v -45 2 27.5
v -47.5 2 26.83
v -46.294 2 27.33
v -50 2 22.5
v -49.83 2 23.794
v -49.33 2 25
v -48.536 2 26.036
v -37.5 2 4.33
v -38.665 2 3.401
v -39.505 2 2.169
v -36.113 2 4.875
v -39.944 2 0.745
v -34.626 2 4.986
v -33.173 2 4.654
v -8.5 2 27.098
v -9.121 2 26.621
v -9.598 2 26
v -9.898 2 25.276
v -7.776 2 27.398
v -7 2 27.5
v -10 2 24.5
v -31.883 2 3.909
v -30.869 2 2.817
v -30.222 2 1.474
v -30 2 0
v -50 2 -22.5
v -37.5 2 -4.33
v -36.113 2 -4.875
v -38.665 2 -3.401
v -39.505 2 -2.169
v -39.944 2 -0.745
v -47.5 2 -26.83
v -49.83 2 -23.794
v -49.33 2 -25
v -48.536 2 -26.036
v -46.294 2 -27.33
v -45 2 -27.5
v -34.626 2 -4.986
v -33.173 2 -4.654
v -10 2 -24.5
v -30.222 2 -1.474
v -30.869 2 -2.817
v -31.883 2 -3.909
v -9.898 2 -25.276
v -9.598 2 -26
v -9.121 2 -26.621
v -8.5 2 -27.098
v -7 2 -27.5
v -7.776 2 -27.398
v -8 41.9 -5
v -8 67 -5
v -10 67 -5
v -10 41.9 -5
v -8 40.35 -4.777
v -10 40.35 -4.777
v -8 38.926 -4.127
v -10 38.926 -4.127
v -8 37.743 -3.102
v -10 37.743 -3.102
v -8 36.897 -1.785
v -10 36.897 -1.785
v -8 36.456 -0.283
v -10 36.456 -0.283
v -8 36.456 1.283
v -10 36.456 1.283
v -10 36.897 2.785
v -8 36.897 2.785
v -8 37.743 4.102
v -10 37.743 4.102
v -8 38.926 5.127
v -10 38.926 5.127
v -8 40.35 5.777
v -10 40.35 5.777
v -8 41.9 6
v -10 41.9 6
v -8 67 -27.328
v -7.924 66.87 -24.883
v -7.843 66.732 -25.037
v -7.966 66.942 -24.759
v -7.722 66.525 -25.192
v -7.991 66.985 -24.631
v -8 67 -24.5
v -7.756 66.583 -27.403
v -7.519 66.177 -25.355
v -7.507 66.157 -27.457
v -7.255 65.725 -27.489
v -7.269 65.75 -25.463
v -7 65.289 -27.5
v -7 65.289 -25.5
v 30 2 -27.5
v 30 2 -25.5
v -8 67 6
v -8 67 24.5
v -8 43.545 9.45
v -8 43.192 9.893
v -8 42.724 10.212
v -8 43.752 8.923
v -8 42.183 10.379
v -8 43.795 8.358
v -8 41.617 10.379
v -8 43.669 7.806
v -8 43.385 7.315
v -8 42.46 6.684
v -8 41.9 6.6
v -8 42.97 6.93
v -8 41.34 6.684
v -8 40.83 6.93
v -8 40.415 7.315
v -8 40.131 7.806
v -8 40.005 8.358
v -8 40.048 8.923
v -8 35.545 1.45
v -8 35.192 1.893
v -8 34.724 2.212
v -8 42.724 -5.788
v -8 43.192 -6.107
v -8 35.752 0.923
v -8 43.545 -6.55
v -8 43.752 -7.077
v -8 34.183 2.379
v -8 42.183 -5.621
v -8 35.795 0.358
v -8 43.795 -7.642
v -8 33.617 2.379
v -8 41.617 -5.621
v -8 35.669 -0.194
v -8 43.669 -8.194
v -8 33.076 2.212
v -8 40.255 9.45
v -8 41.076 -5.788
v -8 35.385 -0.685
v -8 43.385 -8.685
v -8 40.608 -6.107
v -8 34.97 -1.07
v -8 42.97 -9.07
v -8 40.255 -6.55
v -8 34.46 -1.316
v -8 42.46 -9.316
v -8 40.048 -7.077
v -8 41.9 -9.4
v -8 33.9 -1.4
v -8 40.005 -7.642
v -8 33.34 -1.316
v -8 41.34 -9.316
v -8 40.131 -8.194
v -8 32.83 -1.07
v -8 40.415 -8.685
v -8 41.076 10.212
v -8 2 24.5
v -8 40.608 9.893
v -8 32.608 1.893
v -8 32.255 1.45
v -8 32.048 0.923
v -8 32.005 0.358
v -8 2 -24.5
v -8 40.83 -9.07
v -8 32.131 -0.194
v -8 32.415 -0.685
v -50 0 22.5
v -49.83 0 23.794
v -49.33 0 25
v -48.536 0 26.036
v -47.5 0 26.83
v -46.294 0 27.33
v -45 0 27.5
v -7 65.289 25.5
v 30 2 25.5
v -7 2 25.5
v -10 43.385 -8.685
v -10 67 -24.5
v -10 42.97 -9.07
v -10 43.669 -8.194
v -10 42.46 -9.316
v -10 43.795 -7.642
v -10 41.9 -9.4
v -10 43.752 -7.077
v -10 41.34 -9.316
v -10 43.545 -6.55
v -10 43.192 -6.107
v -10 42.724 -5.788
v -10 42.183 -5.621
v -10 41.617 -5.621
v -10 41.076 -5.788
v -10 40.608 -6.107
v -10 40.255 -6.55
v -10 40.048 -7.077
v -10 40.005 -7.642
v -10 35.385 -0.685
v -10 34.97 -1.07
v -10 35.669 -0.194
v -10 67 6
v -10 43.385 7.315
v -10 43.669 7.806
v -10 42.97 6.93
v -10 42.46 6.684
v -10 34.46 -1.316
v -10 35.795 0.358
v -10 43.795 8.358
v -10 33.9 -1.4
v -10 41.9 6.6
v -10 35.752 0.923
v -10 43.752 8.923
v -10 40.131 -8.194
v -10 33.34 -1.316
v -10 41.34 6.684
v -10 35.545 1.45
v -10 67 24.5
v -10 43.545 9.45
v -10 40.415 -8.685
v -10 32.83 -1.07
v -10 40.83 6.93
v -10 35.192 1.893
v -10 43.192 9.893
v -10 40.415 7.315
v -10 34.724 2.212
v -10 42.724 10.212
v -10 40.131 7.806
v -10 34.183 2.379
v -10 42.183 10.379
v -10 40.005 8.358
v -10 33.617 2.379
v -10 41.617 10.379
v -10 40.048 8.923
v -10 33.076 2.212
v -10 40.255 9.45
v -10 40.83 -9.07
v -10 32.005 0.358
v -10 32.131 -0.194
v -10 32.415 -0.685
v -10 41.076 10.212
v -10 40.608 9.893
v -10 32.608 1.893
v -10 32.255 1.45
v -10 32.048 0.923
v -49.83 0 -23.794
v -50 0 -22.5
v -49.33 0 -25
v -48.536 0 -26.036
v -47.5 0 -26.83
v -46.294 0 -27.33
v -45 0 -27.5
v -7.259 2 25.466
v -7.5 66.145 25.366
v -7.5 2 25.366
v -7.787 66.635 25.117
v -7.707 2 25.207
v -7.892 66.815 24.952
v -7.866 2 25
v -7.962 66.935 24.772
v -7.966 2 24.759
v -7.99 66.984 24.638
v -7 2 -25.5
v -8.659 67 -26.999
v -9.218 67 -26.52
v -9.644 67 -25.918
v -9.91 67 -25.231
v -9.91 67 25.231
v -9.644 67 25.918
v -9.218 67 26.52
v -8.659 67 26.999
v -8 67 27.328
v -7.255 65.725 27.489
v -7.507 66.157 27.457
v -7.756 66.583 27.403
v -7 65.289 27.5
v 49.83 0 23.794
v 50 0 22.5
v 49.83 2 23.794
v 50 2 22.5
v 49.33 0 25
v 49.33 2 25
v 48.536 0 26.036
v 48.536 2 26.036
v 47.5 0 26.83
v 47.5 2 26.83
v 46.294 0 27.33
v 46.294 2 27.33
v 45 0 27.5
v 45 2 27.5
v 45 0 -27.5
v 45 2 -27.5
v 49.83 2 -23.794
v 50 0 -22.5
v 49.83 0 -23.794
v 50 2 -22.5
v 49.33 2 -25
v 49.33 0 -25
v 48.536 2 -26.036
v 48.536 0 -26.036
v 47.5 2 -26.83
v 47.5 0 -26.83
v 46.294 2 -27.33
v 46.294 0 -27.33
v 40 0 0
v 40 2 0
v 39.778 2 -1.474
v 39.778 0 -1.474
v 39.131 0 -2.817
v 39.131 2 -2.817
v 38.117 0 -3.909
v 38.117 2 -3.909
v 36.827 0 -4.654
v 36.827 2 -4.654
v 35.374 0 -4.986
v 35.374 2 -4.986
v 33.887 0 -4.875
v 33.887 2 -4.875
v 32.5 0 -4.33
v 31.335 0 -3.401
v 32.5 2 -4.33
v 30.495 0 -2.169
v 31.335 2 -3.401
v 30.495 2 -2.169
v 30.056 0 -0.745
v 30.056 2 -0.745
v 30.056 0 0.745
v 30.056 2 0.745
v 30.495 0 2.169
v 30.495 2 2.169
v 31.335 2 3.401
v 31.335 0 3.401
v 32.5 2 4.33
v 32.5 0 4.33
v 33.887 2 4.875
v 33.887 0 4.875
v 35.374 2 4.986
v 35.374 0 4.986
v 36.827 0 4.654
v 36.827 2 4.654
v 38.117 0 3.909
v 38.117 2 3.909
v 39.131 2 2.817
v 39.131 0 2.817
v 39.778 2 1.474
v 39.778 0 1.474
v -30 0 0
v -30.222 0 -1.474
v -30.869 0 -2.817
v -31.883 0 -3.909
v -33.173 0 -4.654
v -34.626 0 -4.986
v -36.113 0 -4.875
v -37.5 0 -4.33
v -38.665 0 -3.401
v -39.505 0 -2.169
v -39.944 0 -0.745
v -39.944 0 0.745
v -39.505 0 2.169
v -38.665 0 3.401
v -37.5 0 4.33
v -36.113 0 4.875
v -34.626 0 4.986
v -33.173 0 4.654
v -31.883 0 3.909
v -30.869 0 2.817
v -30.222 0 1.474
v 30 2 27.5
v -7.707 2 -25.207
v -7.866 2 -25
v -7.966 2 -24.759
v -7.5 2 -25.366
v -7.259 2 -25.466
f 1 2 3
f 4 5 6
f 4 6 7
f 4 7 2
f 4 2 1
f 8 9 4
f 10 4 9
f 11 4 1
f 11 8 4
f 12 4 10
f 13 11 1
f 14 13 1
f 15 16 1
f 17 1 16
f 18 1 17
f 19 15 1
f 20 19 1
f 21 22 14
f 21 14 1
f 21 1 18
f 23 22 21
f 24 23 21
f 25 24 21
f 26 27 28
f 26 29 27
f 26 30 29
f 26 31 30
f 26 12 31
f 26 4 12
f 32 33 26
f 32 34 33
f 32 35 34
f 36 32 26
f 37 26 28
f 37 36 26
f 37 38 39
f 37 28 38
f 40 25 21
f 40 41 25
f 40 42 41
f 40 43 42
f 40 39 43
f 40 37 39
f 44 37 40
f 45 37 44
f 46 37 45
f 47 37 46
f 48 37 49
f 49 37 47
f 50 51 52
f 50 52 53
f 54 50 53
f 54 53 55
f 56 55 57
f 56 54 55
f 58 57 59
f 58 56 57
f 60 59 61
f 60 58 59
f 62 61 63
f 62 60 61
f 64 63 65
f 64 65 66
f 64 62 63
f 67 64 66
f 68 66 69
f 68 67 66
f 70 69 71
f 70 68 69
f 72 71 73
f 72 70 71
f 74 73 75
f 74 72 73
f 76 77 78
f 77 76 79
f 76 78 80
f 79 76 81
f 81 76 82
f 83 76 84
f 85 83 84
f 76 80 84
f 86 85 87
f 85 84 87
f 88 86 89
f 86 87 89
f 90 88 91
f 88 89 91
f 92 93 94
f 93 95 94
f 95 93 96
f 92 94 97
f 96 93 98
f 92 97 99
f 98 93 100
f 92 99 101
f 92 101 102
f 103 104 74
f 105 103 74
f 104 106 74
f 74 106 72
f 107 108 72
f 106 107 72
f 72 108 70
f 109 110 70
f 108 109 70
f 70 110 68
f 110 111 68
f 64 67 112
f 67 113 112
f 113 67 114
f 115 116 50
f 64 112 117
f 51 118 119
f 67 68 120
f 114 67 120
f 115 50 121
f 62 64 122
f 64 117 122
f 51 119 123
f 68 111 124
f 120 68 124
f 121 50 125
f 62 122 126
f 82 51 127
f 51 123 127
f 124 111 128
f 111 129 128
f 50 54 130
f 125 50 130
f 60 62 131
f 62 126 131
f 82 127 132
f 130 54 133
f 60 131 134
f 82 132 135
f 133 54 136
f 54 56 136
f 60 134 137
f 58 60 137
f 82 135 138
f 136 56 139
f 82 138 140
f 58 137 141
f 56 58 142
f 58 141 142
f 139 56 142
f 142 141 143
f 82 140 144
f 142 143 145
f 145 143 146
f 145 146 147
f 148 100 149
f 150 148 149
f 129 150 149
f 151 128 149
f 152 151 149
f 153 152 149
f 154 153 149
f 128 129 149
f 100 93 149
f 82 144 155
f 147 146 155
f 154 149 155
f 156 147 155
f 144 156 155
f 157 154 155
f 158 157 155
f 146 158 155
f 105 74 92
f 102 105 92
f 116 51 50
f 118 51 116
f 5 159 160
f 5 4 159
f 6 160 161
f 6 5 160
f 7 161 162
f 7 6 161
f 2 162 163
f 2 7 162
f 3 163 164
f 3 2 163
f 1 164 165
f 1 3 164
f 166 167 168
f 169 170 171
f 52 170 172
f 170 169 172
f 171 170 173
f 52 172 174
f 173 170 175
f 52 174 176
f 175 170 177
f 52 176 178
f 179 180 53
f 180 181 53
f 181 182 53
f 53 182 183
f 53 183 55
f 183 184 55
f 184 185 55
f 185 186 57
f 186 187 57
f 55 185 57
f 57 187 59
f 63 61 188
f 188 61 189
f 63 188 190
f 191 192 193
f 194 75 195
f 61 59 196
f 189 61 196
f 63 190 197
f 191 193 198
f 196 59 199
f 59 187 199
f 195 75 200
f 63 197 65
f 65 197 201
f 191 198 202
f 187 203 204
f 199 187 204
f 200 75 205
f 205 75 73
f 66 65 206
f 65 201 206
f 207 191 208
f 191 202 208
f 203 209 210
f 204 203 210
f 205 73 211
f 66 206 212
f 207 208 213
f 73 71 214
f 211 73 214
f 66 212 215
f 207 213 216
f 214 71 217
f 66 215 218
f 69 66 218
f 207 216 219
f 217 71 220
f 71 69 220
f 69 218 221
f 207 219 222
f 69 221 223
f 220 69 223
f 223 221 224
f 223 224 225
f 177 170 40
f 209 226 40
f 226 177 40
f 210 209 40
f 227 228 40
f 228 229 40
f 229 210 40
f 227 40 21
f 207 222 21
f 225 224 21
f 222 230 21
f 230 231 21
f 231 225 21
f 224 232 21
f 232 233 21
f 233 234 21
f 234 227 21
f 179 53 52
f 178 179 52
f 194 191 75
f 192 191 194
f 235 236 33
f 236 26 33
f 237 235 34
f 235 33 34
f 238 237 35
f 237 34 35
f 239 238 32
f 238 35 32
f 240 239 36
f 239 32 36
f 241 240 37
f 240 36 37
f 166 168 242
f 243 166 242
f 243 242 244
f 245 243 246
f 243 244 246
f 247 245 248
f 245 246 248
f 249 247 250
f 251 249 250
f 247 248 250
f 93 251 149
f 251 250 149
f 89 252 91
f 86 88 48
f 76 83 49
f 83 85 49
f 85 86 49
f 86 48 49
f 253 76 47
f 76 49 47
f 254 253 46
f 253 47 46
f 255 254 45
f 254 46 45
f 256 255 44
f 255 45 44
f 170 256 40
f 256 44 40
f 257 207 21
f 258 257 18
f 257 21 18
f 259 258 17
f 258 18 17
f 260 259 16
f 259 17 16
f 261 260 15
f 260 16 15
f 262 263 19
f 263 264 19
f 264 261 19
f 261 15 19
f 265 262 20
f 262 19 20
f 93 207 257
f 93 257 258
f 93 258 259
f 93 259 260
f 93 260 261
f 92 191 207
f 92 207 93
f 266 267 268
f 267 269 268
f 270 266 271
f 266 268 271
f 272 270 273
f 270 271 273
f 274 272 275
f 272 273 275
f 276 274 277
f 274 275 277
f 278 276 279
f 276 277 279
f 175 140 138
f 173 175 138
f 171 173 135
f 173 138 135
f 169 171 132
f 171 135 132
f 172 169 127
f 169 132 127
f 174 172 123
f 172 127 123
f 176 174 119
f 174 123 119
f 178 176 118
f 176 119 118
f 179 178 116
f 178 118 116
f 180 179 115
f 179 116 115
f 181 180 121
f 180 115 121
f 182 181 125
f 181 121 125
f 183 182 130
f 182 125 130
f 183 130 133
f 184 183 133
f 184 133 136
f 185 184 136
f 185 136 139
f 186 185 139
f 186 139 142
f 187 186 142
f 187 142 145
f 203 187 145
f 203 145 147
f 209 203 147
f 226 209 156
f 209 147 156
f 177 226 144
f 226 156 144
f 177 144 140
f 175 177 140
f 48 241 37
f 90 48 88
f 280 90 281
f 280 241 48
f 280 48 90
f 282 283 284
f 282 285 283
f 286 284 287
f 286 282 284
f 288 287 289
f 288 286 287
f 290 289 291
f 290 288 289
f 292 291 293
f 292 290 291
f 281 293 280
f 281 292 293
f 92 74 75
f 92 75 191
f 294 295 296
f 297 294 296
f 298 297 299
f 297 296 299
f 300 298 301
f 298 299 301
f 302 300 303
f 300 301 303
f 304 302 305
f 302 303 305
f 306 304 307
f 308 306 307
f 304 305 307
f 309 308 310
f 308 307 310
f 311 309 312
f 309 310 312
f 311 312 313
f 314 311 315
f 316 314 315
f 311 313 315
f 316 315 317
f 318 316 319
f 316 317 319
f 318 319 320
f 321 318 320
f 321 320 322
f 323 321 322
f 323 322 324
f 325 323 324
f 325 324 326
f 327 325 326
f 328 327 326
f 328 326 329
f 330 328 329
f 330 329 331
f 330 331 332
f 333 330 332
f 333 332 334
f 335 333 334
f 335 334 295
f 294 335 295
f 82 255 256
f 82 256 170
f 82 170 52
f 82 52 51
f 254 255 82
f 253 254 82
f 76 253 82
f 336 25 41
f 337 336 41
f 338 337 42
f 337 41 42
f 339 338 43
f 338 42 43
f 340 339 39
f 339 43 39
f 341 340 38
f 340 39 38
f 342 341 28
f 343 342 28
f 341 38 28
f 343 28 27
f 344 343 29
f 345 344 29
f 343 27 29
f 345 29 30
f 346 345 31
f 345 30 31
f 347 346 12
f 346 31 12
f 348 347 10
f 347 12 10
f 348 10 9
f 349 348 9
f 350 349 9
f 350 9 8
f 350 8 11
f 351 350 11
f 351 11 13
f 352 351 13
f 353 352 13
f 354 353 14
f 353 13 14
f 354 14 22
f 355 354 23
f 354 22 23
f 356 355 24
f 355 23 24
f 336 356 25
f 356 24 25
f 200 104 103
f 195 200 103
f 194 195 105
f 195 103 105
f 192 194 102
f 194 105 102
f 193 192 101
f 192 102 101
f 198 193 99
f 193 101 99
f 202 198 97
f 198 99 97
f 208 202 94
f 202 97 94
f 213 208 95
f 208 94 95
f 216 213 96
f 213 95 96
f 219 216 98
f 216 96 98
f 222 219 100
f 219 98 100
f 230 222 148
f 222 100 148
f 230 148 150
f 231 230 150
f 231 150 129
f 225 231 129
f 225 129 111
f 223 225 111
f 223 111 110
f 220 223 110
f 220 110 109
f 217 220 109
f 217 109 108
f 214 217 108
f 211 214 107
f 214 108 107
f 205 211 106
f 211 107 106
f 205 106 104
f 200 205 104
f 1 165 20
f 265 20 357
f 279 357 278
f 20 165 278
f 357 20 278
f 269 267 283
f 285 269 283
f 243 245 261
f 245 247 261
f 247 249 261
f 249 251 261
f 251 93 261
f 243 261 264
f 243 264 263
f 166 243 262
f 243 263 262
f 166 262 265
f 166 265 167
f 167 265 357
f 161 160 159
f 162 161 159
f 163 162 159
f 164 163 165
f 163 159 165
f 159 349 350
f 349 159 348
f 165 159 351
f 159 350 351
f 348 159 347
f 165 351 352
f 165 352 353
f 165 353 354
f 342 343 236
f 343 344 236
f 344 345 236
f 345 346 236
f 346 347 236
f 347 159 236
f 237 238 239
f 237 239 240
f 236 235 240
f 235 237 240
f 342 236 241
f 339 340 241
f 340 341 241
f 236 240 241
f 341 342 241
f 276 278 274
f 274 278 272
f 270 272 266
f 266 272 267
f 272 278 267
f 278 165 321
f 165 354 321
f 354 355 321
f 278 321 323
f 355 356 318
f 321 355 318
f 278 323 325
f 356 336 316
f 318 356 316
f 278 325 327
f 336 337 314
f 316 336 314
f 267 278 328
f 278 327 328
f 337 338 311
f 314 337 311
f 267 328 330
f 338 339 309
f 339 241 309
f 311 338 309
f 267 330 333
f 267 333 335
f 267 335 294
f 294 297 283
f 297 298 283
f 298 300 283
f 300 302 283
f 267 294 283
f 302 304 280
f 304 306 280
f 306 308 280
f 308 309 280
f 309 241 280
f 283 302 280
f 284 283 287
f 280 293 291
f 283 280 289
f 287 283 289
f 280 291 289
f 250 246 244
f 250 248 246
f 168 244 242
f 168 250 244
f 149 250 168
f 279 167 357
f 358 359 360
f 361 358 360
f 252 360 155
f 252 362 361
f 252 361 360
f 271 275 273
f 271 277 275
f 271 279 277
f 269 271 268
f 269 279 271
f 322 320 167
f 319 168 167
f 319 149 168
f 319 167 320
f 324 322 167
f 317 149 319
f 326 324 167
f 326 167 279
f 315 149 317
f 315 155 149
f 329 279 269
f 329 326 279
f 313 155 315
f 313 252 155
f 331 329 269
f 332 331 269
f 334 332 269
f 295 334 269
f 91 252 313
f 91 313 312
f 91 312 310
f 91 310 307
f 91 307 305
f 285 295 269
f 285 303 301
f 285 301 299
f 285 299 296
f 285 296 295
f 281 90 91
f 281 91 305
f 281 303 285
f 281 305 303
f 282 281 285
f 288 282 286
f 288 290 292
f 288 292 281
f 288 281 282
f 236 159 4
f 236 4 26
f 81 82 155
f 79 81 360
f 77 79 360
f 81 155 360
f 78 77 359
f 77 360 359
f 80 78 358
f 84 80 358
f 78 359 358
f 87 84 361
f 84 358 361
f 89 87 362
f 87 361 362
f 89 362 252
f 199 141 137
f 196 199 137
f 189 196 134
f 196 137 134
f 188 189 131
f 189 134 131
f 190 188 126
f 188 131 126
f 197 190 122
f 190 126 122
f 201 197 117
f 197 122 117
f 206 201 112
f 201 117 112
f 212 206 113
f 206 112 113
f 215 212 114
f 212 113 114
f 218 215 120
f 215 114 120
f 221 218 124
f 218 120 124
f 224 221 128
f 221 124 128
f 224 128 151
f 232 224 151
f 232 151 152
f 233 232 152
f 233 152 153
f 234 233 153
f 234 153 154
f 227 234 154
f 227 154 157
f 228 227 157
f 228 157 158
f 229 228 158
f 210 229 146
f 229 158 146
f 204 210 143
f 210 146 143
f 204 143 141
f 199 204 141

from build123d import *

# Parameters (mm, degrees)
CROQUIS1_W              = 100
CROQUIS1_H              = 55
SALIENTE_EXTRUIR1_DEPTH = 2
CROQUIS2_R              = 5
CORTAR_EXTRUIR1_DEPTH   = 2
SALIENTE_EXTRUIR2_DEPTH = 65
CORTAR_EXTRUIR2_DEPTH   = 55
REDONDEO1_R             = 5
CROQUIS6_R              = 1.9
CORTAR_EXTRUIR3_DEPTH   = 2


with BuildPart() as part:
    # Croquis1 → Saliente-Extruir1 (new body)
    with BuildSketch(Plane(origin=(0, 0, 0), x_dir=(1, 0, 0), z_dir=(0, 1, 0))):
        Rectangle(CROQUIS1_W, CROQUIS1_H)
    extrude(amount=SALIENTE_EXTRUIR1_DEPTH)

    # Croquis2 → Cortar-Extruir1 (cut)
    with BuildSketch(Plane(origin=(0, 2, 0), x_dir=(1, 0, 0), z_dir=(0, 1, 0))):
        with Locations((35, 0)):
            Circle(CROQUIS2_R)
        with Locations((-35, 0)):
            Circle(CROQUIS2_R)
    extrude(amount=-CORTAR_EXTRUIR1_DEPTH, mode=Mode.SUBTRACT)

    # Croquis3 → Saliente-Extruir2 (add)
    with BuildSketch(Plane(origin=(0, 2, 0), x_dir=(1, 0, 0), z_dir=(0, 1, 0))):
        with BuildLine():
            Line((30, 27.5), (-7, 27.5))
            ThreePointArc((-7, 27.5), (-9.121320344, 26.621320344), (-10, 24.5))
            Line((-10, 24.5), (-10, -24.5))
            ThreePointArc((-10, -24.5), (-9.121320344, -26.621320344), (-7, -27.5))
            Line((-7, -27.5), (30, -27.5))
            Line((30, -27.5), (30, -25.5))
            Line((30, -25.5), (-7, -25.5))
            ThreePointArc((-7, -25.5), (-7.707106781, -25.207106781), (-8, -24.5))
            Line((-8, -24.5), (-8, 24.5))
            ThreePointArc((-8, 24.5), (-7.707106781, 25.207106781), (-7, 25.5))
            Line((-7, 25.5), (30, 25.5))
            Line((30, 25.5), (30, 27.5))
        make_face()
    extrude(amount=SALIENTE_EXTRUIR2_DEPTH)

    # Croquis4 → Cortar-Extruir2 (cut)
    with BuildSketch(Plane.XY.offset(27.5)):
        Polygon((-8, 67), (30, 2), (30, 67), align=None)
    extrude(amount=-CORTAR_EXTRUIR2_DEPTH, mode=Mode.SUBTRACT)

    # Redondeo1
    redondeo1_edges = [part.edges().sort_by_distance(p)[0] for p in [
        (50, 1, 27.5),
        (-50, 1, 27.5),
        (-50, 1, -27.5),
        (50, 1, -27.5),
    ]]
    fillet(redondeo1_edges, radius=REDONDEO1_R)

    # Croquis6 → Cortar-Extruir3 (cut)
    with BuildSketch(Plane(origin=(-8, 0, 0), x_dir=(0, 0, -1), z_dir=(1, 0, 0))):
        with Locations((-8.5, 41.9)):
            Circle(CROQUIS6_R)
        with Locations((-0.5, 33.9)):
            Circle(CROQUIS6_R)
        with Locations((7.5, 41.9)):
            Circle(CROQUIS6_R)
        with BuildLine():
            Line((-6, 41.9), (-6, 67))
            Line((-6, 67), (5, 67))
            Line((5, 67), (5, 41.9))
            ThreePointArc((5, 41.9), (-0.5, 36.4), (-6, 41.9))
        make_face()
    extrude(amount=-CORTAR_EXTRUIR3_DEPTH, mode=Mode.SUBTRACT)


solid = part.part
